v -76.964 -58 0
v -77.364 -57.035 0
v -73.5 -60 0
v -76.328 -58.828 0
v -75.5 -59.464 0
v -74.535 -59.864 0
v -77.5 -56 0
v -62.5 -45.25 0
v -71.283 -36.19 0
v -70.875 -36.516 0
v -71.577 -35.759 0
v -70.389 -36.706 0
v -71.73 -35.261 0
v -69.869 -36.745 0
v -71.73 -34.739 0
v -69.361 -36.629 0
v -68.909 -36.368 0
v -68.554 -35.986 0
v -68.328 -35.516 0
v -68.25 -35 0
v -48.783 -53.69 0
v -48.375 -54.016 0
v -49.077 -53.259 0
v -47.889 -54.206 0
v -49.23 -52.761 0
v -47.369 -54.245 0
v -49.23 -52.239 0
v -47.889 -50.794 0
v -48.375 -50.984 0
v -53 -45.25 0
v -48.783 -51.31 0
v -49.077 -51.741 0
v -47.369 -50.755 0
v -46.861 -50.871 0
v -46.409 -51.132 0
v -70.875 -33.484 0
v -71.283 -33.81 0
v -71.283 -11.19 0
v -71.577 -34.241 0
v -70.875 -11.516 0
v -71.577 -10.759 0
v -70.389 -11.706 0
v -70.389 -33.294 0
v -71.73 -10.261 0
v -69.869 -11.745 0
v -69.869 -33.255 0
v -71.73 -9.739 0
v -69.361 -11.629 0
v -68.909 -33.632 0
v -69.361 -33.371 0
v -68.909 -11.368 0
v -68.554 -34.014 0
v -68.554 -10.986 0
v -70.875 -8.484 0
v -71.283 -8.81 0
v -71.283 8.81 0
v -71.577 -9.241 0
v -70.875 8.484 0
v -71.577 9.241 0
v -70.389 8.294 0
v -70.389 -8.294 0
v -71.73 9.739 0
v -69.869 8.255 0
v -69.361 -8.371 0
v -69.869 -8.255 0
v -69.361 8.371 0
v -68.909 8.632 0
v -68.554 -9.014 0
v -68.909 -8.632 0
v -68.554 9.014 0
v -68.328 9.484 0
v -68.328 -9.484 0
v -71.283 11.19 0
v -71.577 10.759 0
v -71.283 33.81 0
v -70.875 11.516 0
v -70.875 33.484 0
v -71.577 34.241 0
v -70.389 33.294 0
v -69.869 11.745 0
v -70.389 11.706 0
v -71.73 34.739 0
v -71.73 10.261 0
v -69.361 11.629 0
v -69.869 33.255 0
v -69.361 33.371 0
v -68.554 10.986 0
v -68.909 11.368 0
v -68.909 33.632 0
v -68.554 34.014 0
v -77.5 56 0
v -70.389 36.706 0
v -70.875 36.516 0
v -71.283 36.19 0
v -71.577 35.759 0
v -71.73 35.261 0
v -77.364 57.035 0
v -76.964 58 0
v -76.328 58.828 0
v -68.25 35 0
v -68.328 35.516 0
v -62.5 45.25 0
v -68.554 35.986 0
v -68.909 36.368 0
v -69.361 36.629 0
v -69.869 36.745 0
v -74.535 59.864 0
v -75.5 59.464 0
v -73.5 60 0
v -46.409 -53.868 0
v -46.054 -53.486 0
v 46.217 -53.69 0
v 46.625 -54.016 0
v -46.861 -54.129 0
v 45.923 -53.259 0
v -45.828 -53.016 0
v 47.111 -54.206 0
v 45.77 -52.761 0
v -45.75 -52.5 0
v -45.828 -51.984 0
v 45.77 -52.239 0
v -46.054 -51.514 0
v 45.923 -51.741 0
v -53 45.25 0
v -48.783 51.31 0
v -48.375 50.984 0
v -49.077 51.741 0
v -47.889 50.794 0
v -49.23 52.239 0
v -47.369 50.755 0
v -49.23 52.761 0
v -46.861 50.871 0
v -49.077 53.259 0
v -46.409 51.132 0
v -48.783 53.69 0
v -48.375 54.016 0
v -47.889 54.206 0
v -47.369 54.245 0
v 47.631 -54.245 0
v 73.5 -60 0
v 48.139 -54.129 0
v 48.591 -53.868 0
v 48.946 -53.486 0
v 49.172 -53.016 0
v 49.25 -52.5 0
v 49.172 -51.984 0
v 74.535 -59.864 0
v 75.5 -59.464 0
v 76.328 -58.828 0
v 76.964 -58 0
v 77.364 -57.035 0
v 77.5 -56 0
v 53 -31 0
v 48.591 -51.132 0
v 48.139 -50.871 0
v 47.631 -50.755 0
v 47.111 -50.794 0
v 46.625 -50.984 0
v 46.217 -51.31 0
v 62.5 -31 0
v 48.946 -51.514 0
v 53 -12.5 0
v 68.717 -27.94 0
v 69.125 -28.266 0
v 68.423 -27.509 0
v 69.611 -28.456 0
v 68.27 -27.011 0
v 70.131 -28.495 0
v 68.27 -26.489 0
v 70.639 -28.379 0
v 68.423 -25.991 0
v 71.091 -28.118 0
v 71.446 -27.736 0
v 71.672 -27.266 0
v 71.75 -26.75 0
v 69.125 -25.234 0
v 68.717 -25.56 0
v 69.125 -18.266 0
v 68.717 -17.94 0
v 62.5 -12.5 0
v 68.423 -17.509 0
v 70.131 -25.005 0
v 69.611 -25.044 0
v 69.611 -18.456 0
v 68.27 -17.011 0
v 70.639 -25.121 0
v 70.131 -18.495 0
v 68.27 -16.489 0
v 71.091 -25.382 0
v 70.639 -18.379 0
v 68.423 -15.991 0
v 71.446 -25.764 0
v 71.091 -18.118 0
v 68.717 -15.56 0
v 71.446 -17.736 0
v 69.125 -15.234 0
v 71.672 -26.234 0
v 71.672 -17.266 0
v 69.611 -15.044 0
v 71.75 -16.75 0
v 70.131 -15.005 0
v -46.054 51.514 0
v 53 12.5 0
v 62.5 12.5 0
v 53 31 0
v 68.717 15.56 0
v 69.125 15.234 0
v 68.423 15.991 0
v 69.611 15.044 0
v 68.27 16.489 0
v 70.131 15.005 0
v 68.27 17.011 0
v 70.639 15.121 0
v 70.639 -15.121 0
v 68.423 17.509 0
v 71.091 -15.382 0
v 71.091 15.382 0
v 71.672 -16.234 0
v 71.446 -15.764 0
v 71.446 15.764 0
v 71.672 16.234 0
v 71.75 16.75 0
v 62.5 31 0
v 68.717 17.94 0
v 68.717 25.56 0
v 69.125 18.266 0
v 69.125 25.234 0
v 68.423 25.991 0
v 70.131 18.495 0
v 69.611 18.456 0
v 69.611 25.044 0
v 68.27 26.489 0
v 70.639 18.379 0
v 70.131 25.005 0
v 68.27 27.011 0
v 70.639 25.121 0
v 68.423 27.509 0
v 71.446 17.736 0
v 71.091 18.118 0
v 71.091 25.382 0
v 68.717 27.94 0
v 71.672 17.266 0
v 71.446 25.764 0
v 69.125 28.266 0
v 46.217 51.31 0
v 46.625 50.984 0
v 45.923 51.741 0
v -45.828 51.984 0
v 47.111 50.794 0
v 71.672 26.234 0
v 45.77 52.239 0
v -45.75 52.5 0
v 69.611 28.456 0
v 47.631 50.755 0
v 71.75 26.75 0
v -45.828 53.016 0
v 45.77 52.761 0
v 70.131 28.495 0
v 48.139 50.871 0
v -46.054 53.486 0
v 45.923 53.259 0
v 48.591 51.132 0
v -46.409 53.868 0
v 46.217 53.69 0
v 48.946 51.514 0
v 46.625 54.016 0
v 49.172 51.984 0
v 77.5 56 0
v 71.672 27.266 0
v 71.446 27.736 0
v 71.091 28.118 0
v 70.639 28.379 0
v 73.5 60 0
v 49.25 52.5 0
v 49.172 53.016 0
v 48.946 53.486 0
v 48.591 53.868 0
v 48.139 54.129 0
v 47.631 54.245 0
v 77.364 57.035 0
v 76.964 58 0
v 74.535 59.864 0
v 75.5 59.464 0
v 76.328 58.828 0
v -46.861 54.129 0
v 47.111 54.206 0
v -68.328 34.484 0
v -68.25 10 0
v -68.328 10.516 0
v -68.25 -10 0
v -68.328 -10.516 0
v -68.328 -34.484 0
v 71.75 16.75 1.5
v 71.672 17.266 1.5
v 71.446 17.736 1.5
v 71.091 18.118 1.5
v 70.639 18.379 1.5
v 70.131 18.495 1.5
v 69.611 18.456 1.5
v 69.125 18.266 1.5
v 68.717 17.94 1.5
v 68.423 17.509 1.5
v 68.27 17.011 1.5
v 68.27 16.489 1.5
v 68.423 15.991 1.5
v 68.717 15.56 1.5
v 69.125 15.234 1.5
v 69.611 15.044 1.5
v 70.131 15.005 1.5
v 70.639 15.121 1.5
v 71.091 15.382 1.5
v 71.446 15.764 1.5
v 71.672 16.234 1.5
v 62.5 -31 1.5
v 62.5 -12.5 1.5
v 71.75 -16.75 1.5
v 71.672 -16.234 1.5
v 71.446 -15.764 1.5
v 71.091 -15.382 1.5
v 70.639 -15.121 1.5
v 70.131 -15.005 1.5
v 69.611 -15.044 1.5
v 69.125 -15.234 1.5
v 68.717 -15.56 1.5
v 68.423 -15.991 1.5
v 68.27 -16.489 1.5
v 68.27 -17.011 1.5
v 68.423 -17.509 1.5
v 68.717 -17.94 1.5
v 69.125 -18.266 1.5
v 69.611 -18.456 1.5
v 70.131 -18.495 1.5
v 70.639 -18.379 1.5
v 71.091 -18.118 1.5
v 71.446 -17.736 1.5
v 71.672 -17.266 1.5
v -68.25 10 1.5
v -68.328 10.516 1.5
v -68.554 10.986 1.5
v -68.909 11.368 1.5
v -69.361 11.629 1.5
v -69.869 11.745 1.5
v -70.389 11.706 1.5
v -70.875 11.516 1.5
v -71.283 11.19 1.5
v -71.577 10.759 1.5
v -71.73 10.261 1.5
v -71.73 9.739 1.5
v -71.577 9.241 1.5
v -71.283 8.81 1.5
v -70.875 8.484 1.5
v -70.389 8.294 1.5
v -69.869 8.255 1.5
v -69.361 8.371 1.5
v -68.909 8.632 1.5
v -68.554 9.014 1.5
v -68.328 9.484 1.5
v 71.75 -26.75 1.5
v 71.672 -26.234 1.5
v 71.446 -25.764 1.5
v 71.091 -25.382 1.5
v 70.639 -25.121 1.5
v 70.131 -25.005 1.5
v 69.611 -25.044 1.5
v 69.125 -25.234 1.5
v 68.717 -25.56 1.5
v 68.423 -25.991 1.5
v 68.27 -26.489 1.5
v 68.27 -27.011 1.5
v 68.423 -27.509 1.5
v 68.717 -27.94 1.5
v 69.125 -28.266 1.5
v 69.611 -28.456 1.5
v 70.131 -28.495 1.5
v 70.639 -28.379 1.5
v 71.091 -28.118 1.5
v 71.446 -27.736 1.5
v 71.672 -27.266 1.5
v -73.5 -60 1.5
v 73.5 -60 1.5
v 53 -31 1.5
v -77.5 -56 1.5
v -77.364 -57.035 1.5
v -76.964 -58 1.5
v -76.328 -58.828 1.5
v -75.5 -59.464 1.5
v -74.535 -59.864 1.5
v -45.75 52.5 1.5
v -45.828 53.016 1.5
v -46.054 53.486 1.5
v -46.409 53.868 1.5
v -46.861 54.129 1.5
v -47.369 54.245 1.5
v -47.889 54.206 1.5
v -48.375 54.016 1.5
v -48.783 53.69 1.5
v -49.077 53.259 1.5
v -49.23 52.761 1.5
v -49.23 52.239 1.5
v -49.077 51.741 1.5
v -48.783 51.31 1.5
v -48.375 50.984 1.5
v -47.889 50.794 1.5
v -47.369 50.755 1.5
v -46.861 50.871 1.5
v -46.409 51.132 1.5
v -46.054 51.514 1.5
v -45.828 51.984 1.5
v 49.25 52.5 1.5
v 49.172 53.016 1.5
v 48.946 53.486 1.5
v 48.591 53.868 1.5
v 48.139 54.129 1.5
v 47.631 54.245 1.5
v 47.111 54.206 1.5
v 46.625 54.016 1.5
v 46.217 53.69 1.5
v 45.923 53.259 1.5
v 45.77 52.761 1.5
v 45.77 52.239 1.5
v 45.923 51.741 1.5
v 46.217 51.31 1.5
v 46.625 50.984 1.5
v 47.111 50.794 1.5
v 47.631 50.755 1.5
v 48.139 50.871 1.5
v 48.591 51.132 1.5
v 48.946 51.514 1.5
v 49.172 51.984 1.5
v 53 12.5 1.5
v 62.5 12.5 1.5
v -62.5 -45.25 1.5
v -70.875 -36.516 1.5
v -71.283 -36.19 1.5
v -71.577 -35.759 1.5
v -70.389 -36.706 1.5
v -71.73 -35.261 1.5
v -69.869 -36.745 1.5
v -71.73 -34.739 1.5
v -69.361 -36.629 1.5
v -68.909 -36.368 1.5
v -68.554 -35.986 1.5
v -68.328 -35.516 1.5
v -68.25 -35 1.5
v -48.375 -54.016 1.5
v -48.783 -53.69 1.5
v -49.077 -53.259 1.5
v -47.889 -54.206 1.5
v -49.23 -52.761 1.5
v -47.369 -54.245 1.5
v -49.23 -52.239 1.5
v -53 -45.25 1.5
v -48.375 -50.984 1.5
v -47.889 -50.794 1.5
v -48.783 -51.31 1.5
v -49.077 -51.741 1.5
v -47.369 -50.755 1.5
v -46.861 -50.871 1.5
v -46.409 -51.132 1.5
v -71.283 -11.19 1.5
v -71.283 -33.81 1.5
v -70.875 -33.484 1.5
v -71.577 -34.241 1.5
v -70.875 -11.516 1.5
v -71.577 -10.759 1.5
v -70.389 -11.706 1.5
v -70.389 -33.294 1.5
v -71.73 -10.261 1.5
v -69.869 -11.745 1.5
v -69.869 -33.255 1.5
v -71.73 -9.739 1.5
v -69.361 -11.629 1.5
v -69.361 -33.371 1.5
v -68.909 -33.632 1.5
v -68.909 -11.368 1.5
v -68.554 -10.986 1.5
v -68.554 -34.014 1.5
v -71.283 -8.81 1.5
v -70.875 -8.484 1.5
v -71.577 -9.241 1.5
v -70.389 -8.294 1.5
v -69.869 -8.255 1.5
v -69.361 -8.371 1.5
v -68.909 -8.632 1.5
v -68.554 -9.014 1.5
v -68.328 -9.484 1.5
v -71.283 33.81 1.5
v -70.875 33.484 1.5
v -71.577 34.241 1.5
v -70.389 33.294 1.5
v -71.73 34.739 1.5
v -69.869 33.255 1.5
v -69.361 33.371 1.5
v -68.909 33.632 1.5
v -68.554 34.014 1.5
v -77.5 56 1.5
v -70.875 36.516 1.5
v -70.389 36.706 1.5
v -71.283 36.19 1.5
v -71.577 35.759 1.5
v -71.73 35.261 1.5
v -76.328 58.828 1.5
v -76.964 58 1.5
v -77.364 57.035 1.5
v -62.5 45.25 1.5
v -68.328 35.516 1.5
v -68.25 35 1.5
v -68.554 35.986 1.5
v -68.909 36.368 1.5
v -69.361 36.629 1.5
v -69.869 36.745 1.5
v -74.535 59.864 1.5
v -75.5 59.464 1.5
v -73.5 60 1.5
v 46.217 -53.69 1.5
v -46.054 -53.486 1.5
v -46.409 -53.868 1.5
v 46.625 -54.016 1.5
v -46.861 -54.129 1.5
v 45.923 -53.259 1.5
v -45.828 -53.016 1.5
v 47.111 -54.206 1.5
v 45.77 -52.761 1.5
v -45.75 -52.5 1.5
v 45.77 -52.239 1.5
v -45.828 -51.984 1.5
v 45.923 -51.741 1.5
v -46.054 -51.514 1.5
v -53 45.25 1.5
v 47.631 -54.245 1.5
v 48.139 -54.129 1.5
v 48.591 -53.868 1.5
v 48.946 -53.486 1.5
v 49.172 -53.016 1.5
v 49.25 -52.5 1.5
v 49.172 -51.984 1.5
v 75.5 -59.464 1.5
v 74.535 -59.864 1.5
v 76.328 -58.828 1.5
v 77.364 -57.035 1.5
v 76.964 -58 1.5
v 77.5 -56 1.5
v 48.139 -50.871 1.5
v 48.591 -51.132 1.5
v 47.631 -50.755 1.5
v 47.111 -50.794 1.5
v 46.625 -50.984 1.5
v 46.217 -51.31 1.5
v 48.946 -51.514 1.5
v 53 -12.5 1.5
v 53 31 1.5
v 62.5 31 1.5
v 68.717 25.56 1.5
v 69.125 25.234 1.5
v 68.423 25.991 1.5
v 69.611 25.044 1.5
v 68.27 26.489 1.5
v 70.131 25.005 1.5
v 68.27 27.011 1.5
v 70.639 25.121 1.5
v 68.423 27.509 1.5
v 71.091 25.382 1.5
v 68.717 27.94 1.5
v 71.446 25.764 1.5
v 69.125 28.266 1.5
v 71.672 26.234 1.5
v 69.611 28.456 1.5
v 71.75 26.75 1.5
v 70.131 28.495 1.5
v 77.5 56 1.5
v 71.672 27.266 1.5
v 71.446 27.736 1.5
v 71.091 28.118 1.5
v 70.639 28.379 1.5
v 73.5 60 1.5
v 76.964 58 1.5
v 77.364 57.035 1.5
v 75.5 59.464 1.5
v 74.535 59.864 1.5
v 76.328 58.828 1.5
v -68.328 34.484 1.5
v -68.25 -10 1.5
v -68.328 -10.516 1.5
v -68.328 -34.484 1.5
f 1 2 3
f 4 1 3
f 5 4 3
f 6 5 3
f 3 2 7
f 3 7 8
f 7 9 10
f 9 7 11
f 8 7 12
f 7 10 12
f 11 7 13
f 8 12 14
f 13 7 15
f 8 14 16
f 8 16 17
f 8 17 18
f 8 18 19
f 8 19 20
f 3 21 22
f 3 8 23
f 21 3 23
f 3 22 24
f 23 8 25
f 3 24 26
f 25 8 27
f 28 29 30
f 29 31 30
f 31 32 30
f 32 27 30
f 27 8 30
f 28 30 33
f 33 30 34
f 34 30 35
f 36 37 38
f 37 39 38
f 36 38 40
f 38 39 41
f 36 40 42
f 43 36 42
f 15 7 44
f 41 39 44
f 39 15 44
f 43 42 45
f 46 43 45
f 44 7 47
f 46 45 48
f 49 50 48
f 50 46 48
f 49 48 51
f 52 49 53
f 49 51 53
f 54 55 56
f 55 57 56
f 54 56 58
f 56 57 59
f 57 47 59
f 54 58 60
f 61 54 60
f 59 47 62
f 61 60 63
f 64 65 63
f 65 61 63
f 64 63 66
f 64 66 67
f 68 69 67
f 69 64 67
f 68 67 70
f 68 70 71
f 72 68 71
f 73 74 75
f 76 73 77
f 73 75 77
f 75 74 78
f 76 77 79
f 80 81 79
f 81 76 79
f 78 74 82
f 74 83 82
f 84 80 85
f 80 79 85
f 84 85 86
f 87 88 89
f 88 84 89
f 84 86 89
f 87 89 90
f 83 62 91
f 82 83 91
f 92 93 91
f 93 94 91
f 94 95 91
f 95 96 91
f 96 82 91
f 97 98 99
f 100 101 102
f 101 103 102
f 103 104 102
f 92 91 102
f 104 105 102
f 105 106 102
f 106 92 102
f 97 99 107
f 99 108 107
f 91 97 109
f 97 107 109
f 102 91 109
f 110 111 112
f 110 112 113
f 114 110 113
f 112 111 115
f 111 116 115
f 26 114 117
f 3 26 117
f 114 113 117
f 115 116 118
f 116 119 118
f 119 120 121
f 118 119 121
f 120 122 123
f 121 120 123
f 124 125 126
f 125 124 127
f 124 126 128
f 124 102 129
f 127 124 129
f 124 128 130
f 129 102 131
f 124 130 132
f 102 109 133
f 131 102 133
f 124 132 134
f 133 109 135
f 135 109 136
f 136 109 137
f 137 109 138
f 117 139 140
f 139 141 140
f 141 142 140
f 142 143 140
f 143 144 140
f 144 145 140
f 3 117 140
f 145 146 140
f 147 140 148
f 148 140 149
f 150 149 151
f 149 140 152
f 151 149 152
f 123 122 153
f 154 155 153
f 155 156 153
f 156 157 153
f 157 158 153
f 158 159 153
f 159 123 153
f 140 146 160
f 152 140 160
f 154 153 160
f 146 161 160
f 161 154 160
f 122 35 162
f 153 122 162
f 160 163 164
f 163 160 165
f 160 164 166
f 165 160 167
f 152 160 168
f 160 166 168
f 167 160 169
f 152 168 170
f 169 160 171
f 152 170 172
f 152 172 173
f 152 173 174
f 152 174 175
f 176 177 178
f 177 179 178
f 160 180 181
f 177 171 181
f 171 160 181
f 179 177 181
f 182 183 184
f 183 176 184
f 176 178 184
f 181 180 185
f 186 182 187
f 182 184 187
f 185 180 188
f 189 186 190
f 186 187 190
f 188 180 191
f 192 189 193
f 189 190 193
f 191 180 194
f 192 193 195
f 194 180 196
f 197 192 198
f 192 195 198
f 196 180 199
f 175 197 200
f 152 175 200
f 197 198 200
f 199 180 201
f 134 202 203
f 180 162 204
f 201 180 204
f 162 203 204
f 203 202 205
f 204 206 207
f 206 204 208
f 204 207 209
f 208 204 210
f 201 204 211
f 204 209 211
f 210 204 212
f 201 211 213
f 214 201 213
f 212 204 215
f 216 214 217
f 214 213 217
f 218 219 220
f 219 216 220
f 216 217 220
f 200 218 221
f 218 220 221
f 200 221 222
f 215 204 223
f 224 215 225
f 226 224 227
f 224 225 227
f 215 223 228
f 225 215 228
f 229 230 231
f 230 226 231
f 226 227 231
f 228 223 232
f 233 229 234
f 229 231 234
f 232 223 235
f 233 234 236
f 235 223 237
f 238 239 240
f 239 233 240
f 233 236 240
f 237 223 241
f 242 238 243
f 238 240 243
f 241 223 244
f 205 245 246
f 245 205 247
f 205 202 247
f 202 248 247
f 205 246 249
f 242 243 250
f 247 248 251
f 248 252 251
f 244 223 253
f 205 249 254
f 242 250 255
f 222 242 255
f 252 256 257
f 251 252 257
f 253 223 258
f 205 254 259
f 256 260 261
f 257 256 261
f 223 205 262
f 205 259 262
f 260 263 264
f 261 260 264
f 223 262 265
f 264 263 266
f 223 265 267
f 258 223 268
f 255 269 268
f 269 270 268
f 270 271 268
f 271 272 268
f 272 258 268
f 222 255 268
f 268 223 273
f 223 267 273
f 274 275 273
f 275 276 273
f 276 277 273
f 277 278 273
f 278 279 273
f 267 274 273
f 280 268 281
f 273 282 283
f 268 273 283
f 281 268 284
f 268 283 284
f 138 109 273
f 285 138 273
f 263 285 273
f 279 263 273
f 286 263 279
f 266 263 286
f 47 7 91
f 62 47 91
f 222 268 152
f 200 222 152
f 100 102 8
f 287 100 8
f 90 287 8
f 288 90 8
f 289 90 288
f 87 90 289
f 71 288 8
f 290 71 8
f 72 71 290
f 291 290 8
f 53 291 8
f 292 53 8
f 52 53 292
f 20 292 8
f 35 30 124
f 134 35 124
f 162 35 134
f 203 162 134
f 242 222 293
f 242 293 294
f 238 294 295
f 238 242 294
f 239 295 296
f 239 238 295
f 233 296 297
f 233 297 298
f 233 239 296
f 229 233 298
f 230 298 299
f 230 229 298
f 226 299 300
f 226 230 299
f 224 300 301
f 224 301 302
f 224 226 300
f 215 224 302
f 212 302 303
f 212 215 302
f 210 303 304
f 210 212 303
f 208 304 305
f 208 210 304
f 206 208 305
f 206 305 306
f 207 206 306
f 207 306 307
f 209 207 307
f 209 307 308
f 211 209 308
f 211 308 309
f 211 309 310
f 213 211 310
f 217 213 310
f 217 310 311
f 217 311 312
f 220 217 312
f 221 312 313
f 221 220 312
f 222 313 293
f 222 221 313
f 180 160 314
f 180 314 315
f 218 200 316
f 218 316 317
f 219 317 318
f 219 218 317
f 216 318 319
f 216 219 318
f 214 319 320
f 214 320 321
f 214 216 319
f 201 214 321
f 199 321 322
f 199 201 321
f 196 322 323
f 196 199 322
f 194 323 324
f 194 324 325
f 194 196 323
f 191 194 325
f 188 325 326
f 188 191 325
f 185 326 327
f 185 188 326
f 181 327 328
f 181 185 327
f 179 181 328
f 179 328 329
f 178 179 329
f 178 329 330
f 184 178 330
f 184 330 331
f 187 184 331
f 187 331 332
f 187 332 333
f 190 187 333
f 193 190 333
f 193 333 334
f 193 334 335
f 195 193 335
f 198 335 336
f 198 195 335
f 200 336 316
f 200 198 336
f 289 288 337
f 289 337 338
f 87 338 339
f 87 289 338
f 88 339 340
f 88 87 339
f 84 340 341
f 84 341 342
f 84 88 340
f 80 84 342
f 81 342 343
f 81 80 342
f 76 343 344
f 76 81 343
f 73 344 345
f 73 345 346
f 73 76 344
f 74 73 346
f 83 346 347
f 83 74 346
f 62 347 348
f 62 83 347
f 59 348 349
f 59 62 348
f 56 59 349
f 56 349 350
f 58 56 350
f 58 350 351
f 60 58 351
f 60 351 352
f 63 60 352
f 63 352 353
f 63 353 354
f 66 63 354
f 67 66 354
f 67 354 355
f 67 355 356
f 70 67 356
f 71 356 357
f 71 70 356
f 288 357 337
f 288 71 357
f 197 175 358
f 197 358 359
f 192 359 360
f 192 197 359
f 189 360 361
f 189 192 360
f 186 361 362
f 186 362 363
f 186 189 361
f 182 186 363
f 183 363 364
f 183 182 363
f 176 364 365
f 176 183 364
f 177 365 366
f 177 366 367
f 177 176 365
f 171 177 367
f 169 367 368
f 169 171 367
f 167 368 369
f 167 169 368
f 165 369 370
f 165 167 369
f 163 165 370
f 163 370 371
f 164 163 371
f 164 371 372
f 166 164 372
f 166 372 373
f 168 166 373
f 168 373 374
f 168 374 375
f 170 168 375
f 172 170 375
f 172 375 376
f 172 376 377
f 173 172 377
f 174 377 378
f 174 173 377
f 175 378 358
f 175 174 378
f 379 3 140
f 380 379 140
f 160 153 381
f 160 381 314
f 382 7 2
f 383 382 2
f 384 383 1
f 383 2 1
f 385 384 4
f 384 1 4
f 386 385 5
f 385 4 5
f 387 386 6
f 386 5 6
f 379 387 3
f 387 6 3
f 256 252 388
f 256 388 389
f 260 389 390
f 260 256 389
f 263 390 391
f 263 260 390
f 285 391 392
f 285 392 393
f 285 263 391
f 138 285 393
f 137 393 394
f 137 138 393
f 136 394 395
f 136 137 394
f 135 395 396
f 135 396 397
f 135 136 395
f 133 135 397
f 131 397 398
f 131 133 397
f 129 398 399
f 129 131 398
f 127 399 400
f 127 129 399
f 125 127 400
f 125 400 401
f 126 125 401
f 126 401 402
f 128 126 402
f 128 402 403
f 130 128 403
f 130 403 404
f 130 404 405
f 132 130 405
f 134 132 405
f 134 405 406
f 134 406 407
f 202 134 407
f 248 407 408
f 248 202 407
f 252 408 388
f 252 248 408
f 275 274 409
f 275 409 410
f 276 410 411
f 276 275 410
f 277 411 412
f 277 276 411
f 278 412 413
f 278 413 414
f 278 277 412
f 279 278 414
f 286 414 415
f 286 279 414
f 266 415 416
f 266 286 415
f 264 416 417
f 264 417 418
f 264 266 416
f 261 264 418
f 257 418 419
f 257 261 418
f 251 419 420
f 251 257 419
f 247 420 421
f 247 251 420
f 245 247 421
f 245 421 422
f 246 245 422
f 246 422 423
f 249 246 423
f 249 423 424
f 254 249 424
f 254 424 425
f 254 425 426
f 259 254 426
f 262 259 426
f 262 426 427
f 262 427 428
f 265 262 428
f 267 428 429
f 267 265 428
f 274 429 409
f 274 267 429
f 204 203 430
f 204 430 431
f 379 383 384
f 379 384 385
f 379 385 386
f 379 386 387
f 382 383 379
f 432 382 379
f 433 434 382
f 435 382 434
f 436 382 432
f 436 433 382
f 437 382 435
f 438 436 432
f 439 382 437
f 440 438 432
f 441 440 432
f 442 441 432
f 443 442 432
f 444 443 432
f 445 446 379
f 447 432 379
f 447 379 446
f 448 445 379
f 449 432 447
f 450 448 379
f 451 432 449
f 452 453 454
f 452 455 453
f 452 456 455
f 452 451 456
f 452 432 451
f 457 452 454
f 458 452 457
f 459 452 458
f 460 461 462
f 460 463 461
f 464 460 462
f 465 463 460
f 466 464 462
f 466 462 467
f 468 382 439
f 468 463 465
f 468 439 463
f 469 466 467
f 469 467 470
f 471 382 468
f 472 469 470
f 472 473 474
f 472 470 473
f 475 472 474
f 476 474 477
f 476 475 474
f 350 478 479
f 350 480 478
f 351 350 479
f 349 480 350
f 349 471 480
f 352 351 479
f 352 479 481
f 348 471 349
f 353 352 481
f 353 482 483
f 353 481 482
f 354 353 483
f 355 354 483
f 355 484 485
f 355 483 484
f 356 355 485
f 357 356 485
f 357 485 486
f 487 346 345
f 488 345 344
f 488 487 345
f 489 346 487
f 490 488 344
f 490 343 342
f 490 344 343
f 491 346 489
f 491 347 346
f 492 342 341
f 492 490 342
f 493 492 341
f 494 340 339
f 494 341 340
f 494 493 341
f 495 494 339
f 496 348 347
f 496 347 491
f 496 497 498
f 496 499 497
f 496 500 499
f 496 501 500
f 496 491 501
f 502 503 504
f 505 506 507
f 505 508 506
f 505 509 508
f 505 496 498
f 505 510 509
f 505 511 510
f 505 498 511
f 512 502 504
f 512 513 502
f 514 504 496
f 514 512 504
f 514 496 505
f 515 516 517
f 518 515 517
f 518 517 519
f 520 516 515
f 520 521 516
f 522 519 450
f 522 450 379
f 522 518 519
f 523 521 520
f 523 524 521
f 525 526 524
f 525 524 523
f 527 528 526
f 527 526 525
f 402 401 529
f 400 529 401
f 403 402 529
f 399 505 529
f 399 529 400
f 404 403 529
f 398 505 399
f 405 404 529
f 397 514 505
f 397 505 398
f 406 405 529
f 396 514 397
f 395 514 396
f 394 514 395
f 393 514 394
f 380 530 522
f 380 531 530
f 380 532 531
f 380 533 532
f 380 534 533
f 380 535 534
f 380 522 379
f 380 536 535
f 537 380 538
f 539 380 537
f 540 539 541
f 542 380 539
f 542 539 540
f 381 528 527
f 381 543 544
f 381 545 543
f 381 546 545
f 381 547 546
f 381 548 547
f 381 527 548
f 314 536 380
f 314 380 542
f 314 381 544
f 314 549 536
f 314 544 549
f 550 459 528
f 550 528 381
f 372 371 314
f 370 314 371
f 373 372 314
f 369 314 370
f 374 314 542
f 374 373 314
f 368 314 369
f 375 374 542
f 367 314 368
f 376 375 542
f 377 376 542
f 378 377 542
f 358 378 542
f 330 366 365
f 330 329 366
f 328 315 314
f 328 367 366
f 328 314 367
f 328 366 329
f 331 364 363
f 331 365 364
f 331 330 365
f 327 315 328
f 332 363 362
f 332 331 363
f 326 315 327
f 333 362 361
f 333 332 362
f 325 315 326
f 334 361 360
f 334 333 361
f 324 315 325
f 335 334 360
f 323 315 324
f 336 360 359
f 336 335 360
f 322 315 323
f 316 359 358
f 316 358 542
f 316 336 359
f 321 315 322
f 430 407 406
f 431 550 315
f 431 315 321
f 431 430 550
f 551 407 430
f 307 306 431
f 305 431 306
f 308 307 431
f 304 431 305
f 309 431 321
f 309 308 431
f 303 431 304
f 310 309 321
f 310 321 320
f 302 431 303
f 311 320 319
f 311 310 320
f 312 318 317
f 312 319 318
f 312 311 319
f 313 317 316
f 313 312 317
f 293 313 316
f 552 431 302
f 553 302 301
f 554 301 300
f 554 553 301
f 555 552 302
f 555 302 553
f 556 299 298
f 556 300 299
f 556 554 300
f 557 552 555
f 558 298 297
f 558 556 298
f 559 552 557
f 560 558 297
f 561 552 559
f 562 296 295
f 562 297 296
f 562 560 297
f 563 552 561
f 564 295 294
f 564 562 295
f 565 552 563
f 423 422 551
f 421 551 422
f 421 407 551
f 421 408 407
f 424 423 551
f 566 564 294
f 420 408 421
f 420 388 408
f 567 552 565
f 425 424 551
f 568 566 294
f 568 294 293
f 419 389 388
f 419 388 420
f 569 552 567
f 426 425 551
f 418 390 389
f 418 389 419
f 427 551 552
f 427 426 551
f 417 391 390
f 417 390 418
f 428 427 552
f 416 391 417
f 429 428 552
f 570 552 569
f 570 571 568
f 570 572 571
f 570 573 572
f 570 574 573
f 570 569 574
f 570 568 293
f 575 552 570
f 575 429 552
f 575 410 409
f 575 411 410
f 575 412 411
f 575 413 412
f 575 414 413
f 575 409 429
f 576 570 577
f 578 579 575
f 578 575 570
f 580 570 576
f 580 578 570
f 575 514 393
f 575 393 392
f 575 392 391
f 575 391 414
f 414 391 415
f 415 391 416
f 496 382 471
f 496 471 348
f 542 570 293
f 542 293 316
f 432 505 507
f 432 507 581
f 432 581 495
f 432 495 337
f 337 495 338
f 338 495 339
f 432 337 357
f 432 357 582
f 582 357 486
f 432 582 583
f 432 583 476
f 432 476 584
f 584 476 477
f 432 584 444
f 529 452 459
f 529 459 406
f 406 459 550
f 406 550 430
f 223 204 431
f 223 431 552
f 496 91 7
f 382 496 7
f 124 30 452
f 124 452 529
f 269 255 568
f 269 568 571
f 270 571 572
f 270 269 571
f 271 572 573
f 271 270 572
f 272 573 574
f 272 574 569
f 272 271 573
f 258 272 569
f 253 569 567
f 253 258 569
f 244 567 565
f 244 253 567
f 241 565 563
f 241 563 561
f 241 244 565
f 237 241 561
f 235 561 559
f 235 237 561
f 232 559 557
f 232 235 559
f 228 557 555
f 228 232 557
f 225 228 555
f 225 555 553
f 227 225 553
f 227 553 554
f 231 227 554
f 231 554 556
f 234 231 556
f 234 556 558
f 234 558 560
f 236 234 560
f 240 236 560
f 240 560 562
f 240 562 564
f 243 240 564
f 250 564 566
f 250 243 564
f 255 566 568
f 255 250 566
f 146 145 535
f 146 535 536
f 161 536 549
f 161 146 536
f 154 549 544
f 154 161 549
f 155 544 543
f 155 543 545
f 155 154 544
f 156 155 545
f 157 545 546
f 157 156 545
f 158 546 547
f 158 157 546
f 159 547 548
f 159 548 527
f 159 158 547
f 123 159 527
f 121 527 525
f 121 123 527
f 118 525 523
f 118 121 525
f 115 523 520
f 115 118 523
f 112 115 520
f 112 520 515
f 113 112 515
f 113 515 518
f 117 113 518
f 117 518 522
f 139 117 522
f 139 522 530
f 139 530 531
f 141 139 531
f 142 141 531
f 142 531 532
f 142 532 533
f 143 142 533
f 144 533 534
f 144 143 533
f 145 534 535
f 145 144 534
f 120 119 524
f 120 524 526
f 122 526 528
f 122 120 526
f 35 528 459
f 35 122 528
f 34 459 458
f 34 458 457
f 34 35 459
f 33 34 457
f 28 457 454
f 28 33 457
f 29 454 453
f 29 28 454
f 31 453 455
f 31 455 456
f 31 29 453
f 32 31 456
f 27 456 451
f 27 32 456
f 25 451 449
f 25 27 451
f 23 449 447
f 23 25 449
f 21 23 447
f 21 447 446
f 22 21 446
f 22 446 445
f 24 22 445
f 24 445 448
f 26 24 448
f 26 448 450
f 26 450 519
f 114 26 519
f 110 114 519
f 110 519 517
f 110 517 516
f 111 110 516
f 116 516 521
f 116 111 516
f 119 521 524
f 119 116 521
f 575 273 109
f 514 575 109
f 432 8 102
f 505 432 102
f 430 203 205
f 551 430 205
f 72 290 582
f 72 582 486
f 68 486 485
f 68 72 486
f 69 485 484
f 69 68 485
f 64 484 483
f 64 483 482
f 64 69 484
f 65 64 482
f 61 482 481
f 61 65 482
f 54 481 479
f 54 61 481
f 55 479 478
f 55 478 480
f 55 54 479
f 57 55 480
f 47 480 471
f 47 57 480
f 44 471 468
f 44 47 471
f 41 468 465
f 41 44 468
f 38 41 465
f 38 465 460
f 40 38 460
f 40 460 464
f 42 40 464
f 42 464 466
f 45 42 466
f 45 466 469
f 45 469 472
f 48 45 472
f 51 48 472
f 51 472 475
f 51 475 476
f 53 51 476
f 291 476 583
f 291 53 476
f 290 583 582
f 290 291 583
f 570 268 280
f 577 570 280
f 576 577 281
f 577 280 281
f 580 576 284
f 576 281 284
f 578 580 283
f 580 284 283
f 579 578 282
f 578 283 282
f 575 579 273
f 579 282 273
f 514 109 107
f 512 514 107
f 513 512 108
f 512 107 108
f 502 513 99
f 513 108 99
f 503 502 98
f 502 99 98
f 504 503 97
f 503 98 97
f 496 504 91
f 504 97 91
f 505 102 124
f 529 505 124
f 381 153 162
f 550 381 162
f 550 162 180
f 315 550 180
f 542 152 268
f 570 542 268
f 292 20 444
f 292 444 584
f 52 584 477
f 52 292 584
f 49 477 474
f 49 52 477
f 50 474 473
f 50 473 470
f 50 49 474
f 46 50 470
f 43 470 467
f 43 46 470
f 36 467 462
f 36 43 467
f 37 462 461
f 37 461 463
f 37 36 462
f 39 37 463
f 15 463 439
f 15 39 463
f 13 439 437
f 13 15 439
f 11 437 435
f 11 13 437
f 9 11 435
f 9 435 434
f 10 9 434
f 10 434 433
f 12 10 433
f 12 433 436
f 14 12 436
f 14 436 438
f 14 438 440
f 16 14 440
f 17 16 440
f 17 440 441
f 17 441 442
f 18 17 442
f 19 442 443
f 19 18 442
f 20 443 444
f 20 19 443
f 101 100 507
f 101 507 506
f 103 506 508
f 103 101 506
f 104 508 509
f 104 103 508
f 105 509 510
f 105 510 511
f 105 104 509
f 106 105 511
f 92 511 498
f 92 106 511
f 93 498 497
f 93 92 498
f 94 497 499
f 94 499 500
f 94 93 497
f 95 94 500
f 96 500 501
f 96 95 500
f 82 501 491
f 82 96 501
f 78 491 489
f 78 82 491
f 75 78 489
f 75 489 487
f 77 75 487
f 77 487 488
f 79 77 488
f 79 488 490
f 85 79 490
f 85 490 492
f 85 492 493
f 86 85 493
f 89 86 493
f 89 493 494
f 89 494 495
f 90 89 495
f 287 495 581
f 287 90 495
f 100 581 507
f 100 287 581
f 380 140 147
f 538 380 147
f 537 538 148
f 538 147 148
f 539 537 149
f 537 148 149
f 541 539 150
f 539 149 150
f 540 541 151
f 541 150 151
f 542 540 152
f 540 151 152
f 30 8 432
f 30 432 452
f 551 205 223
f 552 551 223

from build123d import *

# Parameters (mm, degrees)
F0_R     = 1.75
F0_W     = 9.5
F0_H     = 90.5
F0_H_2   = 18.5
F1_DEPTH = 1.5


with BuildPart() as f1:
    # F0 (on Top) → F1 (new body)
    with BuildSketch(Plane.XY):
        with BuildLine():
            Line((73.5, 60), (-73.5, 60))
            ThreePointArc((-73.5, 60), (-76.328427, 58.828427), (-77.5, 56))
            Line((-77.5, 56), (-77.5, -56))
            ThreePointArc((-77.5, -56), (-76.328427, -58.828427), (-73.5, -60))
            Line((-73.5, -60), (73.5, -60))
            ThreePointArc((73.5, -60), (76.328427, -58.828427), (77.5, -56))
            Line((77.5, -56), (77.5, 56))
            ThreePointArc((77.5, 56), (76.328427, 58.828427), (73.5, 60))
        make_face()
        with Locations((-47.5, -52.5)):
            Circle(F0_R, mode=Mode.SUBTRACT)
        with Locations((-70, -35)):
            Circle(F0_R, mode=Mode.SUBTRACT)
        with Locations((-70, -10)):
            Circle(F0_R, mode=Mode.SUBTRACT)
        with Locations((-57.75, 0)):
            Rectangle(F0_W, F0_H, mode=Mode.SUBTRACT)
        with Locations((47.5, -52.5)):
            Circle(F0_R, mode=Mode.SUBTRACT)
        with Locations((57.75, -21.75)):
            Rectangle(F0_W, F0_H_2, mode=Mode.SUBTRACT)
        with Locations((70, -26.75)):
            Circle(F0_R, mode=Mode.SUBTRACT)
        with Locations((70, -16.75)):
            Circle(F0_R, mode=Mode.SUBTRACT)
        with Locations((-70, 10)):
            Circle(F0_R, mode=Mode.SUBTRACT)
        with Locations((-70, 35)):
            Circle(F0_R, mode=Mode.SUBTRACT)
        with Locations((-47.5, 52.5)):
            Circle(F0_R, mode=Mode.SUBTRACT)
        with Locations((57.75, 21.75)):
            Rectangle(F0_W, F0_H_2, mode=Mode.SUBTRACT)
        with Locations((70, 16.75)):
            Circle(F0_R, mode=Mode.SUBTRACT)
        with Locations((70, 26.75)):
            Circle(F0_R, mode=Mode.SUBTRACT)
        with Locations((47.5, 52.5)):
            Circle(F0_R, mode=Mode.SUBTRACT)
    extrude(amount=F1_DEPTH)


solid = f1.part
